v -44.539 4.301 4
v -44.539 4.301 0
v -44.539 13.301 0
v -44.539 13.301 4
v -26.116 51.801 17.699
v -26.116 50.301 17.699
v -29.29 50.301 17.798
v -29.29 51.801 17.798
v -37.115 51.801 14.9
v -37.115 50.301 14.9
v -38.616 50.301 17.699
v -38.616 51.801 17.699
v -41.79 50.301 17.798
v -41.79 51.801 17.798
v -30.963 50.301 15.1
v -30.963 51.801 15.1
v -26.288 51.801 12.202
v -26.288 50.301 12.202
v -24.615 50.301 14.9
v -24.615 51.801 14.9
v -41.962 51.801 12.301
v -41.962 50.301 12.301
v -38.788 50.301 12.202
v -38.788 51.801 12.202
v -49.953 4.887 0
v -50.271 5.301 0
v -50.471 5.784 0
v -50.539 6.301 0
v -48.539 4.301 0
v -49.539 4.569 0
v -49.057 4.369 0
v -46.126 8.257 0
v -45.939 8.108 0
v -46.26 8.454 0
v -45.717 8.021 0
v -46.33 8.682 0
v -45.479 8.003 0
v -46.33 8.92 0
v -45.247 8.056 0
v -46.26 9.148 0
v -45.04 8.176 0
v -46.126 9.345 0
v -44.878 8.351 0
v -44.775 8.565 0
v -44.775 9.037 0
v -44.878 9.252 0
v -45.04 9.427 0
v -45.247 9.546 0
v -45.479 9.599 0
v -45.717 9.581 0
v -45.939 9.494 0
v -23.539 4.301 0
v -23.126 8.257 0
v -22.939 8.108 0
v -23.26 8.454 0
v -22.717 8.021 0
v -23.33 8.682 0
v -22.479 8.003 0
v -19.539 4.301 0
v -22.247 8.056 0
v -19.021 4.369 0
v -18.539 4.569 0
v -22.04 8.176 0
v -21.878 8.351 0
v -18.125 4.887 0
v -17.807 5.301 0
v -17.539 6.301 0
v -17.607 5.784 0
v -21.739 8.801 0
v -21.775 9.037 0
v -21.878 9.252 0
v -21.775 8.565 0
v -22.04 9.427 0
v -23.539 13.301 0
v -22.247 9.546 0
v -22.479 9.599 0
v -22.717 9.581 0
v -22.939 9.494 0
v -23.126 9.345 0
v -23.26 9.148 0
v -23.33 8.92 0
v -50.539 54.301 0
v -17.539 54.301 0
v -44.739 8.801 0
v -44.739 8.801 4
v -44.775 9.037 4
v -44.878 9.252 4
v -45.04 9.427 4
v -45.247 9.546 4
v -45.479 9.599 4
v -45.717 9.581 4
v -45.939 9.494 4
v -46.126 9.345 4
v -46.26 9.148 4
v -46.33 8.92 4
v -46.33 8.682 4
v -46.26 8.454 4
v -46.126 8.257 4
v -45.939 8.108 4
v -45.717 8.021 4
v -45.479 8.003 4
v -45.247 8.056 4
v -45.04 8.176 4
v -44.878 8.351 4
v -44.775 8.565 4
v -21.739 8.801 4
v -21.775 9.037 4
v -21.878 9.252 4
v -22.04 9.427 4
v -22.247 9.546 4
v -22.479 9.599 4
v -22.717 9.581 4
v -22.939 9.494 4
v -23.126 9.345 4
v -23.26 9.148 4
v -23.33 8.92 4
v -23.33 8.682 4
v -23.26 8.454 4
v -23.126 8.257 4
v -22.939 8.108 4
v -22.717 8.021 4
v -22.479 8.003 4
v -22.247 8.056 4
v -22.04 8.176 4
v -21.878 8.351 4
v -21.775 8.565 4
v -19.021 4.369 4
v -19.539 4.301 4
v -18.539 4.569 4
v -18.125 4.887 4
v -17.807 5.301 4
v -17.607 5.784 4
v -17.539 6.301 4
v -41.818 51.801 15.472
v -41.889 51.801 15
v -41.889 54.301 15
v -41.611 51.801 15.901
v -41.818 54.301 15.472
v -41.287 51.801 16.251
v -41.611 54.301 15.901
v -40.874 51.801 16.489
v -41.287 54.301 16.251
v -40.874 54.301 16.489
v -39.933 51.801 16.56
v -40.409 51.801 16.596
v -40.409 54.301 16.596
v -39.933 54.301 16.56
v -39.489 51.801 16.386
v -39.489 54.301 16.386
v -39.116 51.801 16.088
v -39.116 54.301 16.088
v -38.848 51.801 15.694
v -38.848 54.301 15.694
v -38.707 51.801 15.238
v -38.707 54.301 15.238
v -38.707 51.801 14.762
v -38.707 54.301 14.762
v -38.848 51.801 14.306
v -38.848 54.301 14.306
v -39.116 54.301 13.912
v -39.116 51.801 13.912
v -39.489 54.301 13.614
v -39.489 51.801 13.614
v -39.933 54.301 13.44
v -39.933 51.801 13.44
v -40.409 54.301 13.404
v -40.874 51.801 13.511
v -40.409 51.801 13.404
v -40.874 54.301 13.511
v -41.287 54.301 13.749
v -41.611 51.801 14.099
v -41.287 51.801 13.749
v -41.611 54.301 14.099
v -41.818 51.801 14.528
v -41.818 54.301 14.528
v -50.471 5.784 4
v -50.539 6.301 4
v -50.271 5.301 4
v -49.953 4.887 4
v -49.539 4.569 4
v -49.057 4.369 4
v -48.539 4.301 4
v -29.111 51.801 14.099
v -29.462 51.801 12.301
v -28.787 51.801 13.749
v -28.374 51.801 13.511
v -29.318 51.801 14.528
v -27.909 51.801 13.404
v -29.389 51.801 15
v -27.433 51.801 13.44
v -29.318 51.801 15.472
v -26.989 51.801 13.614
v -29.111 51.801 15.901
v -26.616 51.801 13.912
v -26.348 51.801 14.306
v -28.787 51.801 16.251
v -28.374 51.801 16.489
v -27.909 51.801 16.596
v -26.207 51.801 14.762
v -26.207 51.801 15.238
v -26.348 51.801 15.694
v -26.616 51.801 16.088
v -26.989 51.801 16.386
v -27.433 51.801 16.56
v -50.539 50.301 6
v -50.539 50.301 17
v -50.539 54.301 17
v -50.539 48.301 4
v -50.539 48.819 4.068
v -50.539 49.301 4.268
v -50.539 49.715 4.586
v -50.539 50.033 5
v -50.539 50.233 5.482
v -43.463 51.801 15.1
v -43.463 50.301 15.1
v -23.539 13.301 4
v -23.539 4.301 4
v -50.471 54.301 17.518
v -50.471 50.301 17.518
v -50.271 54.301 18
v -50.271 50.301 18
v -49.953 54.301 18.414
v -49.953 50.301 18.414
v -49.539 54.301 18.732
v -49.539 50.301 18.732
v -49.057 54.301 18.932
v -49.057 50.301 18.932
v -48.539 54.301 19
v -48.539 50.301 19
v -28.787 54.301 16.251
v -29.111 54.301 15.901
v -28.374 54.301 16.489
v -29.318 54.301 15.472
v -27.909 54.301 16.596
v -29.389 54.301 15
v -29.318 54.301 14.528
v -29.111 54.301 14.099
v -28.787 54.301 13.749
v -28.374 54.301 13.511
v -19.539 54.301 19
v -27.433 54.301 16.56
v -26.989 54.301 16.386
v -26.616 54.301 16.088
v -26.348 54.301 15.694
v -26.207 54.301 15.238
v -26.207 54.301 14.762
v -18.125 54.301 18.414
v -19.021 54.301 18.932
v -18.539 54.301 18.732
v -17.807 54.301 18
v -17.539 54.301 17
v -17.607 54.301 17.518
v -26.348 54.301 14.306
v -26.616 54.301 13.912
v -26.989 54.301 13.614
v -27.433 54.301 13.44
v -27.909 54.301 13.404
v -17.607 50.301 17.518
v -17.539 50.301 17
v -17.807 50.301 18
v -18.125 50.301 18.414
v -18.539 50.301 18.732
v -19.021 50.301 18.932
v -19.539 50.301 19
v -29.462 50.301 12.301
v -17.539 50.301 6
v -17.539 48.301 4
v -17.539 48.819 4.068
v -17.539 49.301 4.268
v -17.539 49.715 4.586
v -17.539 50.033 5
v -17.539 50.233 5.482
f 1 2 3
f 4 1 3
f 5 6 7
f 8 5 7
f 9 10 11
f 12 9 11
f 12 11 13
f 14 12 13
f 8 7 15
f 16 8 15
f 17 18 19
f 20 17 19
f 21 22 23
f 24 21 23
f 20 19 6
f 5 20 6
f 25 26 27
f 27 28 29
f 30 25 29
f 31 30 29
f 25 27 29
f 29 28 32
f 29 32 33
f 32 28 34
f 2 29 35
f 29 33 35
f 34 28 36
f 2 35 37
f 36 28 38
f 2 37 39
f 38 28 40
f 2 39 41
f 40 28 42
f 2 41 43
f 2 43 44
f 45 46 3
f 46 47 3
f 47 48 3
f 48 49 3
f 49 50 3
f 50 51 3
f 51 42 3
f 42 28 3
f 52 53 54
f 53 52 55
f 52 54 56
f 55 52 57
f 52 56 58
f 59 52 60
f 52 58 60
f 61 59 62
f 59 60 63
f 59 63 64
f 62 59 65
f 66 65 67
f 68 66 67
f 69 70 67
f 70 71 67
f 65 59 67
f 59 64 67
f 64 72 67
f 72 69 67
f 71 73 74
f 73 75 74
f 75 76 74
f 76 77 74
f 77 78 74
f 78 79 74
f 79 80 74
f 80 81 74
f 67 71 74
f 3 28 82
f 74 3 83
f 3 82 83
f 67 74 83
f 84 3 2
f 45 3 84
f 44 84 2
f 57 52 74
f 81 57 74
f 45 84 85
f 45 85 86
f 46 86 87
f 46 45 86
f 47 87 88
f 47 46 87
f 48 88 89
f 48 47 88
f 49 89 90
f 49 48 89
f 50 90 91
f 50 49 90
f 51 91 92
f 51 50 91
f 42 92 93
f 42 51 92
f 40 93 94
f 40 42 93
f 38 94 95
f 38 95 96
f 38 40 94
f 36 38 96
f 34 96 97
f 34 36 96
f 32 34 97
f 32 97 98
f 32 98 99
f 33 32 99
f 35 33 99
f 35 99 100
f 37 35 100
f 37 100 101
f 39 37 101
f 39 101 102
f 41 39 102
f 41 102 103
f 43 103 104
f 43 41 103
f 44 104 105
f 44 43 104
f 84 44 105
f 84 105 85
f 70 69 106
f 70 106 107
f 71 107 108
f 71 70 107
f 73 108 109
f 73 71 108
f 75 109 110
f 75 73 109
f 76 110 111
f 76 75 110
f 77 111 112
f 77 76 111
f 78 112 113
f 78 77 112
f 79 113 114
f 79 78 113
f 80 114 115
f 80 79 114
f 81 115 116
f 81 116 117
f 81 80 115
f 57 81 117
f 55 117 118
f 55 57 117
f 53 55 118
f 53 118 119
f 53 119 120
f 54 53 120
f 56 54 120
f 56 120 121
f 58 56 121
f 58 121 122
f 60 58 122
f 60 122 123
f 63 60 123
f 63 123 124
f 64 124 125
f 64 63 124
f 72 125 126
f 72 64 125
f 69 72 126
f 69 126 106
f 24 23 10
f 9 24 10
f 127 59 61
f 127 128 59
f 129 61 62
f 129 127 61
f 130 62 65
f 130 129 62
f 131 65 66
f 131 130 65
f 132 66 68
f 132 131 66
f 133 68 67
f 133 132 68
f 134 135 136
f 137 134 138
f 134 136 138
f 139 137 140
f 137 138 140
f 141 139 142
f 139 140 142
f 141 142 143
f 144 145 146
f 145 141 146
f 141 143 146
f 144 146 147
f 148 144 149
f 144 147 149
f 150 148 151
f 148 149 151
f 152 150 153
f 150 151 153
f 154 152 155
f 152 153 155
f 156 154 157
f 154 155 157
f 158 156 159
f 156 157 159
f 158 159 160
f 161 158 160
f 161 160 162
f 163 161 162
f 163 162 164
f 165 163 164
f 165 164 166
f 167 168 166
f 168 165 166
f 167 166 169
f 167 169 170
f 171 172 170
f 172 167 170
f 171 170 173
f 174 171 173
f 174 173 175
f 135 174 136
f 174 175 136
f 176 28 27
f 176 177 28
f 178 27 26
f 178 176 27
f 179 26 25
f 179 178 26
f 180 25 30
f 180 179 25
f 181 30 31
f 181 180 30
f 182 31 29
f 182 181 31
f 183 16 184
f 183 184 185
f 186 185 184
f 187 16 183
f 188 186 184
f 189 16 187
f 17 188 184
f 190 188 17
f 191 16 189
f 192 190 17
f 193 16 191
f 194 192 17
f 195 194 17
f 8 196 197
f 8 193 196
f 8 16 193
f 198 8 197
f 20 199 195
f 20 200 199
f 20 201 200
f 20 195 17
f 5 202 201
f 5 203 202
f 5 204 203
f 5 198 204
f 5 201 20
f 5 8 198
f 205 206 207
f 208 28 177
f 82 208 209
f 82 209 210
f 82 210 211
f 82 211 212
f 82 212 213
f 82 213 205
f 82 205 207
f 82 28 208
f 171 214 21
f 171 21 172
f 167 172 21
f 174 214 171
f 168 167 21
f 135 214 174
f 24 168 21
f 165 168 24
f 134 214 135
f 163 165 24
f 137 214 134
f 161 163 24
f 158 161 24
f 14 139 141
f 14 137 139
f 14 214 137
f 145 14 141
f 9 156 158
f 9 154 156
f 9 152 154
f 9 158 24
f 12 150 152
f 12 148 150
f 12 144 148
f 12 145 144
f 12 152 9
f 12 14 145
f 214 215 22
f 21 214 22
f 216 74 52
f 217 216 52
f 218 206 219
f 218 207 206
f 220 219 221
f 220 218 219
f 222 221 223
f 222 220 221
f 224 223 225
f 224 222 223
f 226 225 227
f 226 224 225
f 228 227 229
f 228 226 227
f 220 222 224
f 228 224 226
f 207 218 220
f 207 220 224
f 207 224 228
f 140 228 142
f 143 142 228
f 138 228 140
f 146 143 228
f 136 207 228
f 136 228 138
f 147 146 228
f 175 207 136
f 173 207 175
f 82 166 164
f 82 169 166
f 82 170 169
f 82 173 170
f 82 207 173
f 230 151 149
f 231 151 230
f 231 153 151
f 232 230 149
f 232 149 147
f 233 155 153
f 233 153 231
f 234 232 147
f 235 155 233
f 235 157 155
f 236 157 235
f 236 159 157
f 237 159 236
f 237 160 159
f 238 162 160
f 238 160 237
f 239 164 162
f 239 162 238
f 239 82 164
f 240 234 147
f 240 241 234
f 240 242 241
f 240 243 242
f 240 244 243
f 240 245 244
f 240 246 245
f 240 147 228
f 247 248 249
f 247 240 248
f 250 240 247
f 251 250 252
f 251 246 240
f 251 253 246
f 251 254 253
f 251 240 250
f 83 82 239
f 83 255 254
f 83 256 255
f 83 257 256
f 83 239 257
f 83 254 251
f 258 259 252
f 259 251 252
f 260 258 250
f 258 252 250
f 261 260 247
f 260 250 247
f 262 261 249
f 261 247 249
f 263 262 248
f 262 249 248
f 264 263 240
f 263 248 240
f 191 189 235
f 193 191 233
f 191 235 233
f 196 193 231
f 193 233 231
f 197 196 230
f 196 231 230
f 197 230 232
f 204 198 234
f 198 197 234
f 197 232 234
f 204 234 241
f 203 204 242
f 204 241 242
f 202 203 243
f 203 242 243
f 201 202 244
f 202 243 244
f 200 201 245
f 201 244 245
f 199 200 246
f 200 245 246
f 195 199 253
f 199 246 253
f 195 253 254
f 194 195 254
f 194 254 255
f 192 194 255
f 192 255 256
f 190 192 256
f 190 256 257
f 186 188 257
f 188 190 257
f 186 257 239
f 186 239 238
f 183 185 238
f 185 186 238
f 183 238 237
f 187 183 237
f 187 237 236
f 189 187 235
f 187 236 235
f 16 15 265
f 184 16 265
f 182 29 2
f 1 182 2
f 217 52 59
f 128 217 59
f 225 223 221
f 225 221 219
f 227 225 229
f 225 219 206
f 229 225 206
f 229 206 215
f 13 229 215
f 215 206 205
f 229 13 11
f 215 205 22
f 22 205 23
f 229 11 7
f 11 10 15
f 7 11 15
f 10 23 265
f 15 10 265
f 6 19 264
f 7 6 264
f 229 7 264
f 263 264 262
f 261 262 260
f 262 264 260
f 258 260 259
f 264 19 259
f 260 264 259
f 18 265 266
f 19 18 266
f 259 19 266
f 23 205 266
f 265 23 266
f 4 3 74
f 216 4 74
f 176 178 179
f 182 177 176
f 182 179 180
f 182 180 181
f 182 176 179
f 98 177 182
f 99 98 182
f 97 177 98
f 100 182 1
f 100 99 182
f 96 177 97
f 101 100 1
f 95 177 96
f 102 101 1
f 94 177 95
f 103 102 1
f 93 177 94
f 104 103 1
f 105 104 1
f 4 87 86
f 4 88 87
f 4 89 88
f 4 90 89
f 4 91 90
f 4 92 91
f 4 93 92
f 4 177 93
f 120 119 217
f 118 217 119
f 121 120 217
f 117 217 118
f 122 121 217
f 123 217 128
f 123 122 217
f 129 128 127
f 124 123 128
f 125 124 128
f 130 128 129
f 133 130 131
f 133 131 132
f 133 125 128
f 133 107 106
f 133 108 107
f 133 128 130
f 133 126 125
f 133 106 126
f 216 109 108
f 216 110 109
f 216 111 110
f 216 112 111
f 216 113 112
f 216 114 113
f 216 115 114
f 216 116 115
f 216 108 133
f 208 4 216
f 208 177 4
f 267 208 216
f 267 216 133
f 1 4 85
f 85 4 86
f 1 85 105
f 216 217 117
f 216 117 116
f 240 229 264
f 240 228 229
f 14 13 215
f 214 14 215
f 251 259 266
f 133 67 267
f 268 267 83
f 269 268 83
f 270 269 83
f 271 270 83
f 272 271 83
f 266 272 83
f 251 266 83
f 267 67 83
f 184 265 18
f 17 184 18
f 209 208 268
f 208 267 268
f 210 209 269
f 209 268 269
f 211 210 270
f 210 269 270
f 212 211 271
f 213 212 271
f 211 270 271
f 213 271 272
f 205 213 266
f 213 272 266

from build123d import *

# Parameters (mm, degrees)
F0_R     = 0.8
F1_DEPTH = 4
F2_W     = 33
F2_H     = 4
F3_DEPTH = 15
F4_R     = 1.6
F5_DEPTH = 25
F6_R     = 1.6
F7_DEPTH = 1.5
F8_R     = 2


with BuildPart() as f1:
    # F0 (on Top) → F1 (new body)
    with BuildSketch(Plane.XY):
        Polygon((-23.5390763283, 54.3011978269), (-44.5390763283, 54.3011978269), (-50.5390763283, 54.3011978269), (-50.5390763283, 4.3011978269), (-44.5390763283, 4.3011978269), (-44.5390763283, 13.3011978269), (-23.5390763283, 13.3011978269), (-23.5390763283, 4.3011978269), (-17.5390763283, 4.3011978269), (-17.5390763283, 54.3011978269), align=None)
        with Locations((-45.5390763283, 8.8011978269)):
            Circle(F0_R, mode=Mode.SUBTRACT)
        with Locations((-22.5390763283, 8.8011978269)):
            Circle(F0_R, mode=Mode.SUBTRACT)
    extrude(amount=F1_DEPTH)

    # F2 (on face) → F3 (join)
    with BuildSketch(Plane.XY.offset(4)):
        with Locations((-34.0390763283, 52.3011978269)):
            Rectangle(F2_W, F2_H)
    extrude(amount=F3_DEPTH)

    # F4 (on face) → F5 (cut)
    with BuildSketch(Plane(origin=(0, 54.3011978269, 0), x_dir=(-1, 0, 0), z_dir=(0, 1, 0))):
        with Locations((40.2890763283, 15)):
            Circle(F4_R)
        with Locations((27.7890763283, 15)):
            Circle(F4_R)
    extrude(amount=-F5_DEPTH, mode=Mode.SUBTRACT)

    # F6 (on face) → F7 (cut)
    with BuildSketch(Plane.XZ.offset(-50.3011978269)):
        Polygon((-38.7884142354, 12.2015456737), (-37.1152127439, 14.9003843318), (-38.6158748368, 17.6988386581), (-41.7897384212, 17.7984543263), (-43.4629399126, 15.0996156682), (-41.9622778197, 12.3011613419), align=None)
        with Locations((-40.2890763283, 15)):
            Circle(F6_R, mode=Mode.SUBTRACT)
        Polygon((-26.2884142354, 12.2015456737), (-24.6152127439, 14.9003843318), (-26.1158748368, 17.6988386581), (-29.2897384212, 17.7984543263), (-30.9629399126, 15.0996156682), (-29.4622778197, 12.3011613419), align=None)
        with Locations((-27.7890763283, 15)):
            Circle(F6_R, mode=Mode.SUBTRACT)
    extrude(amount=-F7_DEPTH, mode=Mode.SUBTRACT)

    # F8
    f8_edges = [f1.edges().sort_by_distance(p)[0] for p in [
        (-50.539076, 4.301198, 2),
        (-17.539076, 4.301198, 2),
        (-17.539076, 52.301198, 19),
        (-50.539076, 52.301198, 19),
        (-34.039076, 50.301198, 4),
    ]]
    fillet(f8_edges, radius=F8_R)


solid = f1.part
